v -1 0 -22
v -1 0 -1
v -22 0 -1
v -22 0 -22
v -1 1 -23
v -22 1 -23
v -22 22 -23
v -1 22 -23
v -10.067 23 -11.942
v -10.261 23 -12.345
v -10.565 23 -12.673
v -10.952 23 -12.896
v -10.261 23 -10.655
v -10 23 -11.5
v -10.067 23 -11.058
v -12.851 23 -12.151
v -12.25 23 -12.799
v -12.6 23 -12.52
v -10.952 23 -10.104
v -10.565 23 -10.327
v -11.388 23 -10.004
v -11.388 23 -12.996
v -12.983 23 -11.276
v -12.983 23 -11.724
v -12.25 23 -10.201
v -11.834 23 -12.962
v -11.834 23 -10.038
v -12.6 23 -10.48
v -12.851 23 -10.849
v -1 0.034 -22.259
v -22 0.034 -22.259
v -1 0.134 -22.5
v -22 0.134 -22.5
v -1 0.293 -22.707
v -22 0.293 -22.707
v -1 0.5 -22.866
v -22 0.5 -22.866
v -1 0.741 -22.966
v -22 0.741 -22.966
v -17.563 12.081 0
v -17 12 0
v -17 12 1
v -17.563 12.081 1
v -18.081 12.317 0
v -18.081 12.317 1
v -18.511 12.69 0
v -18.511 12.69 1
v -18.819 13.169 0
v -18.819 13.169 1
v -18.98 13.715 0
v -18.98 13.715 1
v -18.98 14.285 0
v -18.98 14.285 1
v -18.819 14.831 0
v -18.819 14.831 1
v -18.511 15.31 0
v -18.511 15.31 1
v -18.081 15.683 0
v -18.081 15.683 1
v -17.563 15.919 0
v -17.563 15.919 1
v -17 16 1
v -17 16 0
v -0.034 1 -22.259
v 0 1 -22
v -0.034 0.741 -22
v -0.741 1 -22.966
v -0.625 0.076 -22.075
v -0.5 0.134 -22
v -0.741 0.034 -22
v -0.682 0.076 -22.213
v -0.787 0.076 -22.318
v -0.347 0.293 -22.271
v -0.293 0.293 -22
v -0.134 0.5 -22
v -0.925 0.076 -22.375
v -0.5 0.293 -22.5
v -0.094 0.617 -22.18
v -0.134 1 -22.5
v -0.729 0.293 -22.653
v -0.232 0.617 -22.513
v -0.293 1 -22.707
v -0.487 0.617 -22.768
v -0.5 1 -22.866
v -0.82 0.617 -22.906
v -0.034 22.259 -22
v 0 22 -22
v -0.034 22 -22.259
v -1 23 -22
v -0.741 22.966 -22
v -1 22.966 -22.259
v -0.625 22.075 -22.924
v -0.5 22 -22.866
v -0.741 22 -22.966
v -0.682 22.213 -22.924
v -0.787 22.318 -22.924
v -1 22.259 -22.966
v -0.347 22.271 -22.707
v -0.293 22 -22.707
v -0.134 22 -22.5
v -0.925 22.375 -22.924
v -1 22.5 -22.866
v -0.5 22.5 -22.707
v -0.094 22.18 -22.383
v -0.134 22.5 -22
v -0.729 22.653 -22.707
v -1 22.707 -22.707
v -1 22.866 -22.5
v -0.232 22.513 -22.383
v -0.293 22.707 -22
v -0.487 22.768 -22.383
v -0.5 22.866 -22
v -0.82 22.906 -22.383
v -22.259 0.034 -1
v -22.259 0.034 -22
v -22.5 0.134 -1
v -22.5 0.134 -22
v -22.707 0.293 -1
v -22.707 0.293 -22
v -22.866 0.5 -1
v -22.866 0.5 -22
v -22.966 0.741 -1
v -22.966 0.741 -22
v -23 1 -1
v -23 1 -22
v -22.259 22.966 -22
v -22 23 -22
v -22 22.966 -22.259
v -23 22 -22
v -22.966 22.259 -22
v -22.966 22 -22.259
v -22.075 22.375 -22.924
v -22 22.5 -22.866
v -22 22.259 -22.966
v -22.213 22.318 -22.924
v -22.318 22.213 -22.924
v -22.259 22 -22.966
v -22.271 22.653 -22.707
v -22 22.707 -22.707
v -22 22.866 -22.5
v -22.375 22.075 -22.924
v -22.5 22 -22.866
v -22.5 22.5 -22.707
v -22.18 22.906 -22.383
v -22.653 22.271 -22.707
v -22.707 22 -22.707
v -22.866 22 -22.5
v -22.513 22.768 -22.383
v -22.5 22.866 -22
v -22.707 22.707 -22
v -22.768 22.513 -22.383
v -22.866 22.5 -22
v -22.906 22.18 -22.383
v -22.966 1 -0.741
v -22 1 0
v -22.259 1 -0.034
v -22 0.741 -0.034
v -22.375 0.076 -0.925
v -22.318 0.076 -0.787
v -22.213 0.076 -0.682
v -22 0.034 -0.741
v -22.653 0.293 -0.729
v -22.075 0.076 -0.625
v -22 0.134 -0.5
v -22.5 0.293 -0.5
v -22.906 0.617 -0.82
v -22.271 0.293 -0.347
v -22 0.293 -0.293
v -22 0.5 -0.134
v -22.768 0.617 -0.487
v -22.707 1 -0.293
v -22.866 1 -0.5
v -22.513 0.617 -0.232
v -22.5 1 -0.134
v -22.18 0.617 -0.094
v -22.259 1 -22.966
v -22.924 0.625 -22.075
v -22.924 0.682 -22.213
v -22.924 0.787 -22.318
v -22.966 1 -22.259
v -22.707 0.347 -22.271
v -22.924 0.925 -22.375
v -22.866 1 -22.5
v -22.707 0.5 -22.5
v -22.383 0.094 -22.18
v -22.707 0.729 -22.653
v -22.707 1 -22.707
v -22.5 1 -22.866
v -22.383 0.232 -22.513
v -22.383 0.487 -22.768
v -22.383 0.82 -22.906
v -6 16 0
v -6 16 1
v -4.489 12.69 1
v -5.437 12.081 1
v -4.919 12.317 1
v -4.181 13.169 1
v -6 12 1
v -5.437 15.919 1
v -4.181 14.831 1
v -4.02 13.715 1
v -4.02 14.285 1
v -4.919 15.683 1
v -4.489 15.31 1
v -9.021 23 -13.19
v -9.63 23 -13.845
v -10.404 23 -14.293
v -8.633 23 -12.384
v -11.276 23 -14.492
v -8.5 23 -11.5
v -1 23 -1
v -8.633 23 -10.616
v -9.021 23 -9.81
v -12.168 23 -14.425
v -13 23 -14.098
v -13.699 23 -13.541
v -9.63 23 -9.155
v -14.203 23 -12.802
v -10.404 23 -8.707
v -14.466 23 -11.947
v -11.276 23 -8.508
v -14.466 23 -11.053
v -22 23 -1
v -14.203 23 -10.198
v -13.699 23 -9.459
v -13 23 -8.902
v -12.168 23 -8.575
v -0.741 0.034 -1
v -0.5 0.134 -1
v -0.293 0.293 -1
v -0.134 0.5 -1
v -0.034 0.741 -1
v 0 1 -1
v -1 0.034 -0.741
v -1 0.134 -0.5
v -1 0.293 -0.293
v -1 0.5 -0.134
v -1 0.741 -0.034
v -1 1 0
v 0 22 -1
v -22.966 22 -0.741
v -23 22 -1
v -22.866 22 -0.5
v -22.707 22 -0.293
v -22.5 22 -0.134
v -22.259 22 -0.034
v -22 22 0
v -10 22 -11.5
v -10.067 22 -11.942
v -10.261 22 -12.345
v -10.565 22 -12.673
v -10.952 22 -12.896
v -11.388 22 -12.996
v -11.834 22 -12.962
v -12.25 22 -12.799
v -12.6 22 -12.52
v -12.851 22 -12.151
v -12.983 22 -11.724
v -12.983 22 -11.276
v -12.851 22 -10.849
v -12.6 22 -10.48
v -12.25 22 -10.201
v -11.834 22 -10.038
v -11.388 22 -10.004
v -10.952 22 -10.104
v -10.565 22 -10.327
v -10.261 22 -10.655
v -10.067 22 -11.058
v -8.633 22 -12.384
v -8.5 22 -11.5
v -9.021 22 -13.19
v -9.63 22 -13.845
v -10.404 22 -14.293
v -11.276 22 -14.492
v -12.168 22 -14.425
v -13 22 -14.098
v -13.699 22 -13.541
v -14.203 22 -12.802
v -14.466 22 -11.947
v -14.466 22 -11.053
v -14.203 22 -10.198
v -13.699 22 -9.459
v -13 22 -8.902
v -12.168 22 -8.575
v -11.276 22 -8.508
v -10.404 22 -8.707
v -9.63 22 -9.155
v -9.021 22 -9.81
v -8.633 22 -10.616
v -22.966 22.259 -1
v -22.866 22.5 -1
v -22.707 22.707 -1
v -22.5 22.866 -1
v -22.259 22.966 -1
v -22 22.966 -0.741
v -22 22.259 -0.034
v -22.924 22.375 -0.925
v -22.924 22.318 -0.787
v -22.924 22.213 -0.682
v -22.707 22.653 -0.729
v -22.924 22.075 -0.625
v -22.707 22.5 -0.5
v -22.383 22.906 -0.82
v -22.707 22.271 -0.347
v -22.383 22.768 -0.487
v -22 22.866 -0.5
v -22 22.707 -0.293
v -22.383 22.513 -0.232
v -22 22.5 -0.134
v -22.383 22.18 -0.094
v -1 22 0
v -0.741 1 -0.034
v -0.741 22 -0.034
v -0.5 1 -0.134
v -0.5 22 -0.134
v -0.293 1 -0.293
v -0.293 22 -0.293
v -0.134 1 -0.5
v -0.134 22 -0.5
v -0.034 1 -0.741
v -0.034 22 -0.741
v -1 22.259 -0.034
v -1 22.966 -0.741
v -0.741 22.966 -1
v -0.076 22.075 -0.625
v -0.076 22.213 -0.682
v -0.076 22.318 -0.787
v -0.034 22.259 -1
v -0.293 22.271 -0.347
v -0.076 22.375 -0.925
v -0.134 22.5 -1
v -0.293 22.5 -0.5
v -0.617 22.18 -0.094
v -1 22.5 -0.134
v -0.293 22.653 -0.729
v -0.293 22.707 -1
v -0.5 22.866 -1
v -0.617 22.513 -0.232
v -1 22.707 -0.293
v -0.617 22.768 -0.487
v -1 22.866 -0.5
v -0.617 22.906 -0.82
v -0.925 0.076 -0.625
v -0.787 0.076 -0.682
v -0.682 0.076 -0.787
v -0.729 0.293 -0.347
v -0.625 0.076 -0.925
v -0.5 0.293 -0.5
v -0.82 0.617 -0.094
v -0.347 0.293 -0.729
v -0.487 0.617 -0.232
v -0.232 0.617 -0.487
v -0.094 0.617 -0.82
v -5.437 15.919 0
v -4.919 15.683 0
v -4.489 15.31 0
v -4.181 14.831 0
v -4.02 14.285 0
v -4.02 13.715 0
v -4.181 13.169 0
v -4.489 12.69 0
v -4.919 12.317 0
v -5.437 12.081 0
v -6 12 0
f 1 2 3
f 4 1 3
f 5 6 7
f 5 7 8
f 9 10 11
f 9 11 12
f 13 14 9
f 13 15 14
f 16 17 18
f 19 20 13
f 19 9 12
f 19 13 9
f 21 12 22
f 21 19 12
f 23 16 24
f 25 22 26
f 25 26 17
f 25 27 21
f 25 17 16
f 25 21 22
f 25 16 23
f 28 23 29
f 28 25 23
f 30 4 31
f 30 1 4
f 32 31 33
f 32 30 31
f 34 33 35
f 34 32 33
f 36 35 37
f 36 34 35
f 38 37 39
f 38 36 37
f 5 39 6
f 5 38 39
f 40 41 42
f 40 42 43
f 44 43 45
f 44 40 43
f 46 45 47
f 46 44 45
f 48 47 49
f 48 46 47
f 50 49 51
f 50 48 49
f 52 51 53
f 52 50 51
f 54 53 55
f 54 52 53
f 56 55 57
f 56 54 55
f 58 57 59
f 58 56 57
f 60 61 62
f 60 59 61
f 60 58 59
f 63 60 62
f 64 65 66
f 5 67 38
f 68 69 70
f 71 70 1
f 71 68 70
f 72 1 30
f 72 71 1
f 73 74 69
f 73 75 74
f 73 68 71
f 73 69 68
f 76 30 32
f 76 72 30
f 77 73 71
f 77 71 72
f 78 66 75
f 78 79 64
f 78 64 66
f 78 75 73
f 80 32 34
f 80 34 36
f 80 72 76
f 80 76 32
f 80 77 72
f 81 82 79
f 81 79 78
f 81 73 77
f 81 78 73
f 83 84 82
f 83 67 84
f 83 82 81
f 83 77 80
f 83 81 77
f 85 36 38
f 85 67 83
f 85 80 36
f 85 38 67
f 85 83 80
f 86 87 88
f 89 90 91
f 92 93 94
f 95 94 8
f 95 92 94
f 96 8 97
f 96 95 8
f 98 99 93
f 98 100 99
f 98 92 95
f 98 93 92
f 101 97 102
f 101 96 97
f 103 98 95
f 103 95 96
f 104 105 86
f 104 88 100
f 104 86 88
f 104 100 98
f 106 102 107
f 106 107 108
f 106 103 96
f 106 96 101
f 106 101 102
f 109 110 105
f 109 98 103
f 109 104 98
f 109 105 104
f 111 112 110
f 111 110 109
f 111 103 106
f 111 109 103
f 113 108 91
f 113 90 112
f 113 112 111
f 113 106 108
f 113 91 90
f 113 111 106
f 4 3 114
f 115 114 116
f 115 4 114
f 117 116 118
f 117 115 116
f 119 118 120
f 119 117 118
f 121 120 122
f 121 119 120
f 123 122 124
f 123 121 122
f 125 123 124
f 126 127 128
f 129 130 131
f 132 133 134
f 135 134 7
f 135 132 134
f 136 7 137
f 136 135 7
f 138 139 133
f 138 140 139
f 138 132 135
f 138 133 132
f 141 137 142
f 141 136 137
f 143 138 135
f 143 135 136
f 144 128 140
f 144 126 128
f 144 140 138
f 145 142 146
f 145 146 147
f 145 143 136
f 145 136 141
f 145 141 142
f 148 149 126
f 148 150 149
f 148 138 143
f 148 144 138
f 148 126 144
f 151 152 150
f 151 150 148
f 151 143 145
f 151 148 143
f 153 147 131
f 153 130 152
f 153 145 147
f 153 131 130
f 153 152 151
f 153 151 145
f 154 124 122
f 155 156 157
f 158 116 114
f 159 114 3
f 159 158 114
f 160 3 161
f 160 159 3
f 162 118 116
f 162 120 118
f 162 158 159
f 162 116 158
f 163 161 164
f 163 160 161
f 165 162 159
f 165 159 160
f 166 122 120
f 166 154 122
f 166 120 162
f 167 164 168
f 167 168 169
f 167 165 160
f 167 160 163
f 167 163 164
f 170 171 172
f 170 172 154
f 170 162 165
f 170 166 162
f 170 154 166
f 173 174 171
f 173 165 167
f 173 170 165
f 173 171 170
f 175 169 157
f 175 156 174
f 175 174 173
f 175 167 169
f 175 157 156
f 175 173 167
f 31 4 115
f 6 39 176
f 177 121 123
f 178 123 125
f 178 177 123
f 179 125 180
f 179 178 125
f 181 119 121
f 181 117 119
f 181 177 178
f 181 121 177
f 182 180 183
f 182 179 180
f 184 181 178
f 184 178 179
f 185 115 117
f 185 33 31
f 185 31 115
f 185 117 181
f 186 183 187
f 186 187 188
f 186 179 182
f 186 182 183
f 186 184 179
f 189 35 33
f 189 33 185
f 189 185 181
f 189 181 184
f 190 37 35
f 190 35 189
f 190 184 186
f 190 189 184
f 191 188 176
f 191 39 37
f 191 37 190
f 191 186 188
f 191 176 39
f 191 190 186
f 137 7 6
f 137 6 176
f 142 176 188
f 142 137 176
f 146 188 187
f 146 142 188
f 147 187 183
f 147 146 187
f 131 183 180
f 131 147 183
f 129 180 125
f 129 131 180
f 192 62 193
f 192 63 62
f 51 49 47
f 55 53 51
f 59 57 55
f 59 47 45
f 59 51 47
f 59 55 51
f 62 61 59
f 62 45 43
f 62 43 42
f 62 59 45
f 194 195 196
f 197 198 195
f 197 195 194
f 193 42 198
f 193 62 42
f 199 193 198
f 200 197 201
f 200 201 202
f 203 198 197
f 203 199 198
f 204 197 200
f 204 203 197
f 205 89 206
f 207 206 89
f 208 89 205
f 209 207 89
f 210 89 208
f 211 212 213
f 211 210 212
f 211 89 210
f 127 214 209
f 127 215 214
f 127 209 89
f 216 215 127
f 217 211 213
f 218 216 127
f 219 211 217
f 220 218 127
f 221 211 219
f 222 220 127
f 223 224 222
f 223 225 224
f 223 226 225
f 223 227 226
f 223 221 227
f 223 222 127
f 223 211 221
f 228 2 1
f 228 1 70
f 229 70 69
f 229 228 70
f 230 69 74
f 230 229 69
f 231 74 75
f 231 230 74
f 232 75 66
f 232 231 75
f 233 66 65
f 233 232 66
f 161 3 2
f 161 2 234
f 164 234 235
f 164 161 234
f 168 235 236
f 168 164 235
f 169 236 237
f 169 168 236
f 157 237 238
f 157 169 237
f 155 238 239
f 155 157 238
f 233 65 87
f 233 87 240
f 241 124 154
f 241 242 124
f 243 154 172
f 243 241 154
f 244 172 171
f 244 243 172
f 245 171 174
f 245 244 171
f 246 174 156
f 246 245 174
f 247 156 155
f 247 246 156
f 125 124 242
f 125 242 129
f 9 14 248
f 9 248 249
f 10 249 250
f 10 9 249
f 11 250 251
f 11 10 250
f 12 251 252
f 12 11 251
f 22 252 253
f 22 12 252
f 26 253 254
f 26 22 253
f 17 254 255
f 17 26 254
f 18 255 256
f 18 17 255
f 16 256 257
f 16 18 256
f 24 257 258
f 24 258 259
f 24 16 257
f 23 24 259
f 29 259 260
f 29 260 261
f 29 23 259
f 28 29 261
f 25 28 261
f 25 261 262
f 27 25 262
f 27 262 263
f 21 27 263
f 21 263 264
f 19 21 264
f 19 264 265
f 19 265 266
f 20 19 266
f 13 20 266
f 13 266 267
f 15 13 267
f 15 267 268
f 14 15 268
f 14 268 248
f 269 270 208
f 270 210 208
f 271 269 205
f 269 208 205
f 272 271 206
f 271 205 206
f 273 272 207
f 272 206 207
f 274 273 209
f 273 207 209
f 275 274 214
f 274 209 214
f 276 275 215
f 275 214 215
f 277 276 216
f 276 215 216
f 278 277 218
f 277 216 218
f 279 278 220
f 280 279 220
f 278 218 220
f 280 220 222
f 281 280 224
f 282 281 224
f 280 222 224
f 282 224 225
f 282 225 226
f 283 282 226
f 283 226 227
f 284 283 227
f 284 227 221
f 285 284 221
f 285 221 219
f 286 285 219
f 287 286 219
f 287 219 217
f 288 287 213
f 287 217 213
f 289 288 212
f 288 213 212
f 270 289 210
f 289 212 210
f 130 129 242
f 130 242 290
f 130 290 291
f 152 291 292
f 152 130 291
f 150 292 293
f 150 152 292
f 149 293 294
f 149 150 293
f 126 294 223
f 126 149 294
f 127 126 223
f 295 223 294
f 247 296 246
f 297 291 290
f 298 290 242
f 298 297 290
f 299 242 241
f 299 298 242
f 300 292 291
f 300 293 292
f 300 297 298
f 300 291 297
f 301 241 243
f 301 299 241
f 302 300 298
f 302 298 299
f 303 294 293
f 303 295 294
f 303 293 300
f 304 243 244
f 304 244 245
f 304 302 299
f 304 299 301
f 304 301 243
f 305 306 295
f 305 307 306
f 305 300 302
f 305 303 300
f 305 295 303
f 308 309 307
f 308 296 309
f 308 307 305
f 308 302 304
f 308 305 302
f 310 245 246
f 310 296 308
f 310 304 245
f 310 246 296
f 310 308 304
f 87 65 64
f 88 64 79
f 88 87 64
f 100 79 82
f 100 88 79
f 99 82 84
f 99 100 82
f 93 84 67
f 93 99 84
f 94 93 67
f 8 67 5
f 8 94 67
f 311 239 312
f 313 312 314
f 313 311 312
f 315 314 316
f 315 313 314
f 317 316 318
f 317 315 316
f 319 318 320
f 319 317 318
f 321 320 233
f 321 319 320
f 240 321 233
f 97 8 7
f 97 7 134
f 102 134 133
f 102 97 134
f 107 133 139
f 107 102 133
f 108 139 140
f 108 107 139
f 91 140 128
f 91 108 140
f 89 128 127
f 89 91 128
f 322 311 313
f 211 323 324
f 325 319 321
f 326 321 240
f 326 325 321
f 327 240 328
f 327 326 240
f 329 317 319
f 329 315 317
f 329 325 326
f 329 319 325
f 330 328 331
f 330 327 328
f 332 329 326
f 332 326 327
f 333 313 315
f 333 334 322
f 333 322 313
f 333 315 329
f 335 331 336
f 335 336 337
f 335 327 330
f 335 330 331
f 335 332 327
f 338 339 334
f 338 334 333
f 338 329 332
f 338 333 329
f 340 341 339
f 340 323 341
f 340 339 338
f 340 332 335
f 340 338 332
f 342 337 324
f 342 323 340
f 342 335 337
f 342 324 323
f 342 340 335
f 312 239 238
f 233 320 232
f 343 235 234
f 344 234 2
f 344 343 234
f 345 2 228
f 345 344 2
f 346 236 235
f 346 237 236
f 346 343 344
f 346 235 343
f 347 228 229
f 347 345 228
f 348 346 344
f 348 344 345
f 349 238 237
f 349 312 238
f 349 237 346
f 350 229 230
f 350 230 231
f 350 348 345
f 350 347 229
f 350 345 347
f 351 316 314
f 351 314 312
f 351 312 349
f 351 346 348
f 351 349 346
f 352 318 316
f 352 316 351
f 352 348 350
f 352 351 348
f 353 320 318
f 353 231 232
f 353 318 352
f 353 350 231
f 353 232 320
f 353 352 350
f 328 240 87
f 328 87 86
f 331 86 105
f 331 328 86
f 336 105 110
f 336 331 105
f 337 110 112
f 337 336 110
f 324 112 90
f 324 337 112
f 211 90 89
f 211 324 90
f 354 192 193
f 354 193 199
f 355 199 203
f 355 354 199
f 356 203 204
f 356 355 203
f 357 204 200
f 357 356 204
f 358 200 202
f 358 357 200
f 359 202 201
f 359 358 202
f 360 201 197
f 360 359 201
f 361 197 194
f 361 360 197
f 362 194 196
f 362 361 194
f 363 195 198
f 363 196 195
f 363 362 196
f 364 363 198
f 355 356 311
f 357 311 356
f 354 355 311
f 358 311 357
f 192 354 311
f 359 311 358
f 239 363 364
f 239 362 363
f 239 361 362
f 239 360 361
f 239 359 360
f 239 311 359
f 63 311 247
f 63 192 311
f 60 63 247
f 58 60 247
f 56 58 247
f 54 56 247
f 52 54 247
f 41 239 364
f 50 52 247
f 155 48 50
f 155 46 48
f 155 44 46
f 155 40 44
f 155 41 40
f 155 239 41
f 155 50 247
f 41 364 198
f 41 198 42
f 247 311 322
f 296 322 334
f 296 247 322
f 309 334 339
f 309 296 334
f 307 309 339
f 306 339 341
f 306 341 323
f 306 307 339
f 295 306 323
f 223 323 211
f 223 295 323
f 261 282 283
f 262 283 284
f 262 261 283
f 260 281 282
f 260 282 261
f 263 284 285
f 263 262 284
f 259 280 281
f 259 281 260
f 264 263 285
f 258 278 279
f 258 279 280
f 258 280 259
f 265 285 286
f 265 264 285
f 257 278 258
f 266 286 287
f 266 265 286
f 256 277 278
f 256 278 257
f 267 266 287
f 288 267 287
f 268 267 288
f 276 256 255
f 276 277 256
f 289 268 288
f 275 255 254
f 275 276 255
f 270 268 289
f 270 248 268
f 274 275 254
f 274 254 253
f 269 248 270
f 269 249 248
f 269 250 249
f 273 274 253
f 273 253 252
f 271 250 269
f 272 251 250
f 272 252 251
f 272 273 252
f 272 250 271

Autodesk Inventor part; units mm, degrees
ref_plane "YZ Plane" through (0, 0, 0) normal (1, 0, 0) x (0, 1, 0)
ref_plane "XZ Plane" through (0, 0, 0) normal (0, 1, 0) x (-1, 0, 0)
ref_plane "XY Plane" through (0, 0, 0) normal (0, 0, 1) x (1, 0, 0)
sketch "Sketch1" plane through (0, 0, 0) normal (0, 1, 0) x (-1, 0, 0)
  line L0 (0, 0) -> (23, 0)
  line L1 (23, 0) -> (23, -23)
  line L2 (23, -23) -> (0, -23)
  line L3 (0, -23) -> (0, 0)
  dimension "d0" = 23
  dimension "d1" = 23
extrude "Extrusion1" add sketch "Sketch1" along normal blind 23
sketch "Sketch2" plane through (0, 23, 0) normal (0, 1, 0) x (1, 0, 0)
  circle A0 centre (-11.5, 11.5) radius 1.5
  line L0 (0, 0) -> (0, 23) projected
  line L1 (-23, 0) -> (0, 0) projected
  circle A1 centre (-11.5, 11.5) radius 3
  dimension "d4" = 3
  dimension "d5" = 11.5
  dimension "d6" = 11.5
  dimension "d7" = 6
extrude "Extrusion2" cut sketch "Sketch2" against normal blind 1
sketch "Sketch3" plane through (-23, 0, 0) normal (0, 0, 1) x (1, 0, 0)
  line L0 (6, 16) -> (19, 16)
  line L1 (17, 12) -> (6, 12)
  line L2 (0, 0) -> (0, 23) projected
  line L3 (23, 0) -> (23, 23) projected
  line L4 (0, 23) -> (23, 23) projected
  arc A0 (6, 16) -> (6, 12) centre (6, 14) ccw
  arc A1 (17, 12) -> (17, 16) centre (17, 14) ccw
  point P0 (4, 14)
  dimension "d13" = 7
  dimension "d16" = 4
  dimension "d17" = 6
  dimension "d18" = 6
extrude "Extrusion3" add sketch "Sketch3" along normal blind 1
fillet "Fillet1" radius 1 12 edges at (-11.5, 23, 0) (0, 11.5, 0) (0, 23, -11.5) (-23, 23, -11.5) (-11.5, 23, -23) (-23, 11.5, 0) (0, 11.5, -23) (0, 0, -11.5) (-11.5, 0, 0) (-11.5, 0, -23) (-23, 11.5, -23) (-23, 0, -11.5)
properties part number "Runcam"
